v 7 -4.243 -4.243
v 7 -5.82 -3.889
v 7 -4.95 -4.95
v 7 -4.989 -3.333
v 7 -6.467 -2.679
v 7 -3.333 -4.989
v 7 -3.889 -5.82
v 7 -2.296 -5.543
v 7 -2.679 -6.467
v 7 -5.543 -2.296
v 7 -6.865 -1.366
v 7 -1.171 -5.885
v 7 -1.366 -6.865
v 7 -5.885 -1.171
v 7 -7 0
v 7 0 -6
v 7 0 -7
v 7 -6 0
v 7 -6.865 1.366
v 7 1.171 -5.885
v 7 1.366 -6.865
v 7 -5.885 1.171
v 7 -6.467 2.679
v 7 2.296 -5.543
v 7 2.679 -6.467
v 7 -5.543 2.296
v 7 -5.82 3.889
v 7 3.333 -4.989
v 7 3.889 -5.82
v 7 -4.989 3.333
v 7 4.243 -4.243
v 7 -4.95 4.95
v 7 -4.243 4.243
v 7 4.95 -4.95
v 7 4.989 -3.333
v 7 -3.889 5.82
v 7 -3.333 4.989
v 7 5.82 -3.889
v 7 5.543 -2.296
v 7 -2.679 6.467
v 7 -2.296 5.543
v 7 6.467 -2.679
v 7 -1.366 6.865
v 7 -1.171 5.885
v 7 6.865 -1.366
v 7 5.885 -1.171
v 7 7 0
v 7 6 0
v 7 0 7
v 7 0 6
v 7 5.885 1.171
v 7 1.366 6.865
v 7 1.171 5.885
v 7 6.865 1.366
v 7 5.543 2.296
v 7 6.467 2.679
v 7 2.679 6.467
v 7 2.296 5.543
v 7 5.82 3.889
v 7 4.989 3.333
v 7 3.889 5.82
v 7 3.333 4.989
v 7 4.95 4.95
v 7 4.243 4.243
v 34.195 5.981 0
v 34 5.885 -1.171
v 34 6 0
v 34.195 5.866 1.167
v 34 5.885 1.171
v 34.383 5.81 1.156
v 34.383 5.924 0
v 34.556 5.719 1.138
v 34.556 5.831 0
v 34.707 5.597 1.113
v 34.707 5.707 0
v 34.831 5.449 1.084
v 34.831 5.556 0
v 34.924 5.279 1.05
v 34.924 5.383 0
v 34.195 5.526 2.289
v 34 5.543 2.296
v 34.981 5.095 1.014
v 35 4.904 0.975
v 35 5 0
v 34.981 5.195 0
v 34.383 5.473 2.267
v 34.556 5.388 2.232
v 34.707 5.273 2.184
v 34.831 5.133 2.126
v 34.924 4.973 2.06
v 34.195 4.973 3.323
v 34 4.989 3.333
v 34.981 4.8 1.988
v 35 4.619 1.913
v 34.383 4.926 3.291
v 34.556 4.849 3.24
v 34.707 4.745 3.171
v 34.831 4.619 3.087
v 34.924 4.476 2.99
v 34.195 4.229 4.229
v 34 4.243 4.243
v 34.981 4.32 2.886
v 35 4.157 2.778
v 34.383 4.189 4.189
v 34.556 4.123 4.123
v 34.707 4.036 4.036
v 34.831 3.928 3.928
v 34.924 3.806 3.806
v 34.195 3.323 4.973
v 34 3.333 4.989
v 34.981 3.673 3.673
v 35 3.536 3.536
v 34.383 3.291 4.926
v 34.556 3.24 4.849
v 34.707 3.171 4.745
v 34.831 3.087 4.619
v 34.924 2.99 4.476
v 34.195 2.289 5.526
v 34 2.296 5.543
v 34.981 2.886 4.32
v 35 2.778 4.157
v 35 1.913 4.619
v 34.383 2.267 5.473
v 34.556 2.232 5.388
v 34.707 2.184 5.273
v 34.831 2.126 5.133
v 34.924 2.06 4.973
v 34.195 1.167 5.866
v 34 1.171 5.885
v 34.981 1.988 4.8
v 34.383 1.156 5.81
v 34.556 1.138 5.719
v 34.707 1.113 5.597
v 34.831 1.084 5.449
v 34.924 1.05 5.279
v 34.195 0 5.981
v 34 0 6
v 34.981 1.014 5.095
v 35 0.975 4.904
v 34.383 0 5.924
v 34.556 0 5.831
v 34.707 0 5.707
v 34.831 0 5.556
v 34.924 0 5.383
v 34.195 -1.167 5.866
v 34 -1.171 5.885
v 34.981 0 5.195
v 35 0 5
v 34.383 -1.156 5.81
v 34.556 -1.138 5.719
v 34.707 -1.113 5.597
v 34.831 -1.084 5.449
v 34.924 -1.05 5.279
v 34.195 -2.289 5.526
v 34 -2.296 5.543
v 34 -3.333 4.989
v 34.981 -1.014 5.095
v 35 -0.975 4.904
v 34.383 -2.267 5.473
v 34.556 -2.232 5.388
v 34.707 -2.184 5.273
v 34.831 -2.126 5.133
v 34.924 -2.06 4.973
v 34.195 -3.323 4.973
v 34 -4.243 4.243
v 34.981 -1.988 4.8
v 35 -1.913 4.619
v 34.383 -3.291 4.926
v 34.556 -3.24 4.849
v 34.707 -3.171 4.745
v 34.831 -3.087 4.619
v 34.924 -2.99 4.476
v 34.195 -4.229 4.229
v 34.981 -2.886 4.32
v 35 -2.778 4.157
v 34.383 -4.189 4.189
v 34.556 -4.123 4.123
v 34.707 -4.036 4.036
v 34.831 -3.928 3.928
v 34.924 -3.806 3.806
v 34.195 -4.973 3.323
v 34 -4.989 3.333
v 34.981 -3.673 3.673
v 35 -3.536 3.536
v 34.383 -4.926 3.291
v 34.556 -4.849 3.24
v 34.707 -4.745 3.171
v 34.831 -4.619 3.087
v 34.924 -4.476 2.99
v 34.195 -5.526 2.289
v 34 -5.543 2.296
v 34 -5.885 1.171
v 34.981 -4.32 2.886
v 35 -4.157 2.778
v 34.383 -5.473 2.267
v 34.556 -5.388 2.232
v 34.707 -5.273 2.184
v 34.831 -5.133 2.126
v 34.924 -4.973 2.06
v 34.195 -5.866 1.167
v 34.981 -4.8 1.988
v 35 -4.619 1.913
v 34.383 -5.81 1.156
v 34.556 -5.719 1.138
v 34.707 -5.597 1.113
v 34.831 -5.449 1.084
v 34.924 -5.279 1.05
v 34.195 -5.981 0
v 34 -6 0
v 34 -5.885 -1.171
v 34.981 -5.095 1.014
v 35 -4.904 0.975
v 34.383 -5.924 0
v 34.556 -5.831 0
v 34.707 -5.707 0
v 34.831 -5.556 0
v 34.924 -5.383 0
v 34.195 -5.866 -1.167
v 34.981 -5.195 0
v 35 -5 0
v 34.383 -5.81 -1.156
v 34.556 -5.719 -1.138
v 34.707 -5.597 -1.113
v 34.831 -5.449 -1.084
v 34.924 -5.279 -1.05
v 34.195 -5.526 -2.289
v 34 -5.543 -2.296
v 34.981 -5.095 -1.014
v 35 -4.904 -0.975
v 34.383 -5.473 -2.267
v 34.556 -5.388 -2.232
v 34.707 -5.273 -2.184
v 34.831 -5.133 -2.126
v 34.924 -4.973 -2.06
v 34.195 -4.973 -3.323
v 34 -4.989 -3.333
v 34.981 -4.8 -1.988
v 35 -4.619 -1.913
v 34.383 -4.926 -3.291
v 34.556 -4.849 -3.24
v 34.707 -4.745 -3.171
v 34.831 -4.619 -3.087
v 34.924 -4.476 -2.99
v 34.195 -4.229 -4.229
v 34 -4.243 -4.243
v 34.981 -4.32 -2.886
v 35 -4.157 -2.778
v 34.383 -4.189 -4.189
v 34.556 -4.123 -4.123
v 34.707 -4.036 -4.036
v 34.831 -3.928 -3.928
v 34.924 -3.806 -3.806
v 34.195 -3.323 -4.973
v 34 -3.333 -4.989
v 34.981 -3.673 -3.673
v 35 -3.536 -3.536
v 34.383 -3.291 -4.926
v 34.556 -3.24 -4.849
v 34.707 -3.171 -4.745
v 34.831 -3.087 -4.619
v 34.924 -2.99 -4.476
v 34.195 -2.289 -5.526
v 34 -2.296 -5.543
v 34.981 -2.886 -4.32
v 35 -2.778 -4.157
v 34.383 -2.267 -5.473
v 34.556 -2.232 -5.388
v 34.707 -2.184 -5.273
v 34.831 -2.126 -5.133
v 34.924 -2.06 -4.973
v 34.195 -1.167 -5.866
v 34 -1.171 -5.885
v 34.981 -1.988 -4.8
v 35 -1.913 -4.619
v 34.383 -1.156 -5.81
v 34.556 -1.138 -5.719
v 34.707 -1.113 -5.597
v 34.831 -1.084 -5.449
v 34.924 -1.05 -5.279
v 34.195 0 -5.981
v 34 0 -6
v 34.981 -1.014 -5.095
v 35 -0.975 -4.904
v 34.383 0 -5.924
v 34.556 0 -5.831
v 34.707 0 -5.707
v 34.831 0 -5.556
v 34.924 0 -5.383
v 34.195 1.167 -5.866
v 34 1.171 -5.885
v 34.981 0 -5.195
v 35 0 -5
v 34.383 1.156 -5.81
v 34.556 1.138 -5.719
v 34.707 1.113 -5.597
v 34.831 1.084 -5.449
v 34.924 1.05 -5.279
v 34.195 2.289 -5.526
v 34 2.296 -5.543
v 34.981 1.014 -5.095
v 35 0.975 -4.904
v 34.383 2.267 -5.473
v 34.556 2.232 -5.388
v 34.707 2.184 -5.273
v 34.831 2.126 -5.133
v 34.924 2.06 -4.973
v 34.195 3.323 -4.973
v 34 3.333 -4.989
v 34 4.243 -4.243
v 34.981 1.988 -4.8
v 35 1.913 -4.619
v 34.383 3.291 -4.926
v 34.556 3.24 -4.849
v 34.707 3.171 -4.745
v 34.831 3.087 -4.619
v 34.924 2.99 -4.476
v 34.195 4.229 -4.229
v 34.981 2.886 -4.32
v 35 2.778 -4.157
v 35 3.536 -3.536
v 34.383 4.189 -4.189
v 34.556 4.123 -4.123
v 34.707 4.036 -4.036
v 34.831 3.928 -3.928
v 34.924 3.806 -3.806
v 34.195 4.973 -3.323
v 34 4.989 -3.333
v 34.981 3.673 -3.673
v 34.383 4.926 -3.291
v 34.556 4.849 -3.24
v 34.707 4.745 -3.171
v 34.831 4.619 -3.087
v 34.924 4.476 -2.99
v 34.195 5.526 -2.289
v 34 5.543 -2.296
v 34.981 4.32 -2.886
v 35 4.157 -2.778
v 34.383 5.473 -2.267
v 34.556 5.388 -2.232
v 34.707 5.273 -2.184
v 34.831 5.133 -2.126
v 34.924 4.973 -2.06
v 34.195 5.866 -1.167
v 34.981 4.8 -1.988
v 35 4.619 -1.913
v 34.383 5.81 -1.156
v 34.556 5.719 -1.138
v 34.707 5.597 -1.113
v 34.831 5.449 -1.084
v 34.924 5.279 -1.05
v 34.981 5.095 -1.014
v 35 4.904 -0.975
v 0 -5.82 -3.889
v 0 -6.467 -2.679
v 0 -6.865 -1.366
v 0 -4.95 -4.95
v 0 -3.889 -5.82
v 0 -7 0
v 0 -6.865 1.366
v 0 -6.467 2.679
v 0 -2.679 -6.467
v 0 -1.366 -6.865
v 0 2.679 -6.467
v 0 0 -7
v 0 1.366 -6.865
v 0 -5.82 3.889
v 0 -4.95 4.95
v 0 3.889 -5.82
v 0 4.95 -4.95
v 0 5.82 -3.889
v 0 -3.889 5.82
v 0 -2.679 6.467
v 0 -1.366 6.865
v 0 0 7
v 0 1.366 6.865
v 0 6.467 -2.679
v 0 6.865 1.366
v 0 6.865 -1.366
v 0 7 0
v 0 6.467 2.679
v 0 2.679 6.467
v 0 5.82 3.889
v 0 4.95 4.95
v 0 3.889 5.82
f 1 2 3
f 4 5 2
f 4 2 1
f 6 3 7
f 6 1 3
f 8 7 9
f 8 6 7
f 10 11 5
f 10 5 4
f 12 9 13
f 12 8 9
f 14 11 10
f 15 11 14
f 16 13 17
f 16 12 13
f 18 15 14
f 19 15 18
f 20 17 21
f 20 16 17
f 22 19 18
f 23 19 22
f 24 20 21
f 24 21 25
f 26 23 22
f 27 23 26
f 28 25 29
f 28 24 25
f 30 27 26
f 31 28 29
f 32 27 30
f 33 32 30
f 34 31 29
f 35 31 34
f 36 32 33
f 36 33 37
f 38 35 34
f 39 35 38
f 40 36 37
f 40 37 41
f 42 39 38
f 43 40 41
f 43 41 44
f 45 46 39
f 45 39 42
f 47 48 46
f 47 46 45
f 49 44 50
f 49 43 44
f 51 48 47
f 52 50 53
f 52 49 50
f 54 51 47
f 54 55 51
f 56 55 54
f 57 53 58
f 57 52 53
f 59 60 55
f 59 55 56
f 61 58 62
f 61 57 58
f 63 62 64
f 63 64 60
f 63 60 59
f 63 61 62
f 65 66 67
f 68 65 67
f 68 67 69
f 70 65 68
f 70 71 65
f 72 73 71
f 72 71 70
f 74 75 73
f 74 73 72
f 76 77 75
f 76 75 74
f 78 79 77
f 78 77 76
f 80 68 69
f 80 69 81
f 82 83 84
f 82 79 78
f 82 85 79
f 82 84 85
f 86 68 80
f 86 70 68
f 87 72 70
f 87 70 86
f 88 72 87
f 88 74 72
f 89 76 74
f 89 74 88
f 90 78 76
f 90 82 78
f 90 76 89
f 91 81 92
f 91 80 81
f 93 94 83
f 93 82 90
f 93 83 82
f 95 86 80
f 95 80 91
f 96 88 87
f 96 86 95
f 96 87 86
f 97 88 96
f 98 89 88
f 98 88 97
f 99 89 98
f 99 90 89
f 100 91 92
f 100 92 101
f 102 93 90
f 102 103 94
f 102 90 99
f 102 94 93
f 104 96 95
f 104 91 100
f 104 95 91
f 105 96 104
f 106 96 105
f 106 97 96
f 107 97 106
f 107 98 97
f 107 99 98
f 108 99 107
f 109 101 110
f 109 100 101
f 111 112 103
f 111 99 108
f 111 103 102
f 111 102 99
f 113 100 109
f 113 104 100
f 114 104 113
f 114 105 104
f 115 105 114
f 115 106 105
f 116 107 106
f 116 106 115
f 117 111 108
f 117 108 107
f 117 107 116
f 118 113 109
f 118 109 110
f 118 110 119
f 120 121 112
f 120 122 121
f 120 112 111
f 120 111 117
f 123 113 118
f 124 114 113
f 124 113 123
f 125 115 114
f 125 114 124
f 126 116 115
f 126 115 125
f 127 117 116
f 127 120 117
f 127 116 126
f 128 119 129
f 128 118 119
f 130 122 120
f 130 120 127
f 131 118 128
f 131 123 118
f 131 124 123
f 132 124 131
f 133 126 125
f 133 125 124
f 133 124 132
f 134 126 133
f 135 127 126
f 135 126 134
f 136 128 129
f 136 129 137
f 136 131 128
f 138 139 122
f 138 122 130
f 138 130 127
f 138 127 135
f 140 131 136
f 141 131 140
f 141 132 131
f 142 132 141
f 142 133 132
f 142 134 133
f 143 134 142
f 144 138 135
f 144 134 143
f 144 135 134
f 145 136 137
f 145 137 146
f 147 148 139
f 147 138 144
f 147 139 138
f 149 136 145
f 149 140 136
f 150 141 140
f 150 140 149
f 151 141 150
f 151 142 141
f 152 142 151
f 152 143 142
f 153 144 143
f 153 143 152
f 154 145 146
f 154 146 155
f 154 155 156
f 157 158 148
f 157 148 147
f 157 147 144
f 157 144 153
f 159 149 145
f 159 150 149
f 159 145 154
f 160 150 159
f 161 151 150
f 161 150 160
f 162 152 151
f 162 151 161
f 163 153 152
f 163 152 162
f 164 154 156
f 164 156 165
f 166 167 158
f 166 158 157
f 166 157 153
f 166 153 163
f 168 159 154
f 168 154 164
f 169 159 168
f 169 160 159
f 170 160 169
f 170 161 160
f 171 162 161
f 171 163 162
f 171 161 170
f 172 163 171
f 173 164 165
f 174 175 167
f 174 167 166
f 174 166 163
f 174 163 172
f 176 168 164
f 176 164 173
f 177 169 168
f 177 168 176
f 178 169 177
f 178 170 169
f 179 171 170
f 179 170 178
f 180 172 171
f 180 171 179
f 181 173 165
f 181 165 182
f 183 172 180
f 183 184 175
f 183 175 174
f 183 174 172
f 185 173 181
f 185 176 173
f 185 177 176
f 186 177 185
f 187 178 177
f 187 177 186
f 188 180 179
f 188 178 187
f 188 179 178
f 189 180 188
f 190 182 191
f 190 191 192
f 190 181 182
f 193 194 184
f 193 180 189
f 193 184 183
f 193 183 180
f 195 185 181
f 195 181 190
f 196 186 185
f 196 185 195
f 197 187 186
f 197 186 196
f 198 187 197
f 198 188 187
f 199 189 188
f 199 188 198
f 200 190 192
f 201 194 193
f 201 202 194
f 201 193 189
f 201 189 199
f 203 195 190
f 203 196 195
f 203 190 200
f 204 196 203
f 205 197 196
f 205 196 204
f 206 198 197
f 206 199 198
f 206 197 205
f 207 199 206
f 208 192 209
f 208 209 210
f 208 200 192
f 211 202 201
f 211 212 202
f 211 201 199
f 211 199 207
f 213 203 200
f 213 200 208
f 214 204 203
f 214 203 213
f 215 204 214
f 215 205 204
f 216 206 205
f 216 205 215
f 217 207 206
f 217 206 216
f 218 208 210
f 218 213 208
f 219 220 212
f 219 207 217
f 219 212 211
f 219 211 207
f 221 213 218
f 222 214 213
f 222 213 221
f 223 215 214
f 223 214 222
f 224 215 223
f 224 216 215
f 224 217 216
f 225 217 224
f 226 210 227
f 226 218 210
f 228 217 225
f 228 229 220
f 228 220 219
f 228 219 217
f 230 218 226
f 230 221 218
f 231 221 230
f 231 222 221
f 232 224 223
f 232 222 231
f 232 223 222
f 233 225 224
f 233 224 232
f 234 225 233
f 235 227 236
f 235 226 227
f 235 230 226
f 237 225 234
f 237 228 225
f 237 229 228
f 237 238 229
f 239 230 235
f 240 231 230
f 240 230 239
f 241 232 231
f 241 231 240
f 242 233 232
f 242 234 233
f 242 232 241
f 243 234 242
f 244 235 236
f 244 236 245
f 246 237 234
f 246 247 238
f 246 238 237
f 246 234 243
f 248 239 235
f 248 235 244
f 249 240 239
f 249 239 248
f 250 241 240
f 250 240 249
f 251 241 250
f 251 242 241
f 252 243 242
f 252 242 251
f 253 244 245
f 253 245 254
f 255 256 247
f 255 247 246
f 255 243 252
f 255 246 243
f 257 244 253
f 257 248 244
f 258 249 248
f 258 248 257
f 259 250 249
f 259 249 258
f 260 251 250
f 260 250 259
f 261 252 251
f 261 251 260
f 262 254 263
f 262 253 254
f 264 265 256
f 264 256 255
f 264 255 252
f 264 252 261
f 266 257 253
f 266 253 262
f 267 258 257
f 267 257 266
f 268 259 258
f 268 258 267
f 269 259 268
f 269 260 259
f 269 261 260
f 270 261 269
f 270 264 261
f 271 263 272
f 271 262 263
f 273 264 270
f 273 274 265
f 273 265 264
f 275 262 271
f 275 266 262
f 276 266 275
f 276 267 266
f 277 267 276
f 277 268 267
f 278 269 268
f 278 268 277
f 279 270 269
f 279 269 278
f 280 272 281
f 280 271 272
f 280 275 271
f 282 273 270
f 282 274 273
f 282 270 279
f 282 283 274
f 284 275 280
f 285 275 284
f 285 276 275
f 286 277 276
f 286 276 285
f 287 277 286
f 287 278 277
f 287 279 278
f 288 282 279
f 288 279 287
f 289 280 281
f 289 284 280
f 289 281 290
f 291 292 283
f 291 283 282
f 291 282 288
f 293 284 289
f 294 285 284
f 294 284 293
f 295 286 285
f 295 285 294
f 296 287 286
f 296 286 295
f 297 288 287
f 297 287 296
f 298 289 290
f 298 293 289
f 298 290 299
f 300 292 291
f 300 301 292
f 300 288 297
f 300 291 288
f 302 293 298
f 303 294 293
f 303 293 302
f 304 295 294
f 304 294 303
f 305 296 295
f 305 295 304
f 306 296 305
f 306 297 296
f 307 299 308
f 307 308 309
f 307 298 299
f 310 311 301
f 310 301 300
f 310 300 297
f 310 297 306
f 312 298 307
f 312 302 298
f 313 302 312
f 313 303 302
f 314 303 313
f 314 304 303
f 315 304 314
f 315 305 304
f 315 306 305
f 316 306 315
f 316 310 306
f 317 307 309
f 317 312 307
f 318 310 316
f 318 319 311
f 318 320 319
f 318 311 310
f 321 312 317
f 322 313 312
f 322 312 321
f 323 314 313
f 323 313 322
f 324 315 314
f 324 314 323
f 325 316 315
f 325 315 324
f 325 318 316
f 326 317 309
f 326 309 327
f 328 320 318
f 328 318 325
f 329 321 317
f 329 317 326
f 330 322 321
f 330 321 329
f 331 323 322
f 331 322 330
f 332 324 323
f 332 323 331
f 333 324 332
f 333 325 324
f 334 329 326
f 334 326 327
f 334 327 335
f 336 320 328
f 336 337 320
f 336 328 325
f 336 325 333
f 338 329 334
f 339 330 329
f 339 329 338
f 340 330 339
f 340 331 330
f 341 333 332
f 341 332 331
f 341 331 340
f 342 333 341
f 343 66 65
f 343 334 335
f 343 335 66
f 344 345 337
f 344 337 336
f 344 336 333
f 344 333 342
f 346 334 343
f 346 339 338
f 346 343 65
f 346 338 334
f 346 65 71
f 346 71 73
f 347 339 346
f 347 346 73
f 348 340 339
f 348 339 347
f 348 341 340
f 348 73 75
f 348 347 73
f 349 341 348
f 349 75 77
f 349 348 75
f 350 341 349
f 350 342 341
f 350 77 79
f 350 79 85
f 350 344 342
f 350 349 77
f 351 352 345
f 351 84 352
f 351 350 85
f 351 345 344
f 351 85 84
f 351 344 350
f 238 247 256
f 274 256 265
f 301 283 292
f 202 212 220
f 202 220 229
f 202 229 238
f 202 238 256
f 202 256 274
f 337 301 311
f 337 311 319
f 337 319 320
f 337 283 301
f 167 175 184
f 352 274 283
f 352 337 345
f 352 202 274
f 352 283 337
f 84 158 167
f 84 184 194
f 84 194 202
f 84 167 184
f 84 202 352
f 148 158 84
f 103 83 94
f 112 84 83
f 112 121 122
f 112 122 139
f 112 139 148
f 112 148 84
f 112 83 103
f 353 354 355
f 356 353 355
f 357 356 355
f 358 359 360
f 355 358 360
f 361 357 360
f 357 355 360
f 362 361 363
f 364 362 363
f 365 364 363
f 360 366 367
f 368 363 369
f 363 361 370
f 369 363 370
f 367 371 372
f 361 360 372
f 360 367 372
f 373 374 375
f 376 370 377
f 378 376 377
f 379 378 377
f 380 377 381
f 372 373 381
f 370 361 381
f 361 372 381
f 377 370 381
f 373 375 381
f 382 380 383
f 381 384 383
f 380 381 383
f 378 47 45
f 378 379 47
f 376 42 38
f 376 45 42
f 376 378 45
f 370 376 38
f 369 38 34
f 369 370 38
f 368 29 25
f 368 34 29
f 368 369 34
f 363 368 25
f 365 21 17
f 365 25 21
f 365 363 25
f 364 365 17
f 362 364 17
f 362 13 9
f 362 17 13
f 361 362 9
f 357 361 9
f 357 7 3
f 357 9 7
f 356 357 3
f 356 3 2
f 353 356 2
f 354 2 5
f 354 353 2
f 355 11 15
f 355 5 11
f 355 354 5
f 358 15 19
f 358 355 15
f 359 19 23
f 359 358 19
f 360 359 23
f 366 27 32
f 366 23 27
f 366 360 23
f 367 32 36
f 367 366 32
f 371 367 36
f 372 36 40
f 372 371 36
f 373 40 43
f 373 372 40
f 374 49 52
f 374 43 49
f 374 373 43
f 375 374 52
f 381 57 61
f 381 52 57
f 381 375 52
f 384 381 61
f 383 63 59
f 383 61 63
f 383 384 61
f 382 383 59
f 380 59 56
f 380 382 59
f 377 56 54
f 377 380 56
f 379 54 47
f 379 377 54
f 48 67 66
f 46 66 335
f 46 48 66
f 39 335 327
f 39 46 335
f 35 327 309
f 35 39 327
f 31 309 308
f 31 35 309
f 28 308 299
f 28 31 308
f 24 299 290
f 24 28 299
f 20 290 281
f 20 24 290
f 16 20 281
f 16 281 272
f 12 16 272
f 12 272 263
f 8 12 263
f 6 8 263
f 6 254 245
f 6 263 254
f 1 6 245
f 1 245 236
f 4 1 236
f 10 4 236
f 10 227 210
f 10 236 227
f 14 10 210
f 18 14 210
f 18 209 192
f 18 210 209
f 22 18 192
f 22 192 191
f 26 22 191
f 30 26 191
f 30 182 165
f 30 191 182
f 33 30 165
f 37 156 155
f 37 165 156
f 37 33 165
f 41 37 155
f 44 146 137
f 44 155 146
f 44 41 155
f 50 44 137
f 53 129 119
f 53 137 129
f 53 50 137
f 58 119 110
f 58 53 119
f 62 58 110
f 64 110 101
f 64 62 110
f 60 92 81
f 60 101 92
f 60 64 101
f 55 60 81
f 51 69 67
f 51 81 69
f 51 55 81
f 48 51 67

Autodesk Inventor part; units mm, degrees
ref_plane "YZ Plane" through (0, 0, 0) normal (1, 0, 0) x (0, 1, 0)
ref_plane "XZ Plane" through (0, 0, 0) normal (0, 1, 0) x (-1, 0, 0)
ref_plane "XY Plane" through (0, 0, 0) normal (0, 0, 1) x (1, 0, 0)
sketch "Sketch2" plane through (0, 0, 0) normal (1, 0, 0) x (0, 1, 0)
  circle A0 centre (0, 0) radius 7
  circle A1 centre (0, 0) radius 6
  dimension "d0" = 14
  dimension "d1" = 12
extrude "Extrusion1" add sketch "Sketch2" along normal blind 35 contours A1
extrude "Extrusion2" add sketch "Sketch2" along normal blind 7 contours A0 | A1
fillet "Fillet1" radius 1 1 edges at (35, -6, 0)
thread "Thread1" size "M12x1.5" class "6g" standard "ANSI Metric M Profile" length 30
properties part number "bolt" material "Steel, Cast"
